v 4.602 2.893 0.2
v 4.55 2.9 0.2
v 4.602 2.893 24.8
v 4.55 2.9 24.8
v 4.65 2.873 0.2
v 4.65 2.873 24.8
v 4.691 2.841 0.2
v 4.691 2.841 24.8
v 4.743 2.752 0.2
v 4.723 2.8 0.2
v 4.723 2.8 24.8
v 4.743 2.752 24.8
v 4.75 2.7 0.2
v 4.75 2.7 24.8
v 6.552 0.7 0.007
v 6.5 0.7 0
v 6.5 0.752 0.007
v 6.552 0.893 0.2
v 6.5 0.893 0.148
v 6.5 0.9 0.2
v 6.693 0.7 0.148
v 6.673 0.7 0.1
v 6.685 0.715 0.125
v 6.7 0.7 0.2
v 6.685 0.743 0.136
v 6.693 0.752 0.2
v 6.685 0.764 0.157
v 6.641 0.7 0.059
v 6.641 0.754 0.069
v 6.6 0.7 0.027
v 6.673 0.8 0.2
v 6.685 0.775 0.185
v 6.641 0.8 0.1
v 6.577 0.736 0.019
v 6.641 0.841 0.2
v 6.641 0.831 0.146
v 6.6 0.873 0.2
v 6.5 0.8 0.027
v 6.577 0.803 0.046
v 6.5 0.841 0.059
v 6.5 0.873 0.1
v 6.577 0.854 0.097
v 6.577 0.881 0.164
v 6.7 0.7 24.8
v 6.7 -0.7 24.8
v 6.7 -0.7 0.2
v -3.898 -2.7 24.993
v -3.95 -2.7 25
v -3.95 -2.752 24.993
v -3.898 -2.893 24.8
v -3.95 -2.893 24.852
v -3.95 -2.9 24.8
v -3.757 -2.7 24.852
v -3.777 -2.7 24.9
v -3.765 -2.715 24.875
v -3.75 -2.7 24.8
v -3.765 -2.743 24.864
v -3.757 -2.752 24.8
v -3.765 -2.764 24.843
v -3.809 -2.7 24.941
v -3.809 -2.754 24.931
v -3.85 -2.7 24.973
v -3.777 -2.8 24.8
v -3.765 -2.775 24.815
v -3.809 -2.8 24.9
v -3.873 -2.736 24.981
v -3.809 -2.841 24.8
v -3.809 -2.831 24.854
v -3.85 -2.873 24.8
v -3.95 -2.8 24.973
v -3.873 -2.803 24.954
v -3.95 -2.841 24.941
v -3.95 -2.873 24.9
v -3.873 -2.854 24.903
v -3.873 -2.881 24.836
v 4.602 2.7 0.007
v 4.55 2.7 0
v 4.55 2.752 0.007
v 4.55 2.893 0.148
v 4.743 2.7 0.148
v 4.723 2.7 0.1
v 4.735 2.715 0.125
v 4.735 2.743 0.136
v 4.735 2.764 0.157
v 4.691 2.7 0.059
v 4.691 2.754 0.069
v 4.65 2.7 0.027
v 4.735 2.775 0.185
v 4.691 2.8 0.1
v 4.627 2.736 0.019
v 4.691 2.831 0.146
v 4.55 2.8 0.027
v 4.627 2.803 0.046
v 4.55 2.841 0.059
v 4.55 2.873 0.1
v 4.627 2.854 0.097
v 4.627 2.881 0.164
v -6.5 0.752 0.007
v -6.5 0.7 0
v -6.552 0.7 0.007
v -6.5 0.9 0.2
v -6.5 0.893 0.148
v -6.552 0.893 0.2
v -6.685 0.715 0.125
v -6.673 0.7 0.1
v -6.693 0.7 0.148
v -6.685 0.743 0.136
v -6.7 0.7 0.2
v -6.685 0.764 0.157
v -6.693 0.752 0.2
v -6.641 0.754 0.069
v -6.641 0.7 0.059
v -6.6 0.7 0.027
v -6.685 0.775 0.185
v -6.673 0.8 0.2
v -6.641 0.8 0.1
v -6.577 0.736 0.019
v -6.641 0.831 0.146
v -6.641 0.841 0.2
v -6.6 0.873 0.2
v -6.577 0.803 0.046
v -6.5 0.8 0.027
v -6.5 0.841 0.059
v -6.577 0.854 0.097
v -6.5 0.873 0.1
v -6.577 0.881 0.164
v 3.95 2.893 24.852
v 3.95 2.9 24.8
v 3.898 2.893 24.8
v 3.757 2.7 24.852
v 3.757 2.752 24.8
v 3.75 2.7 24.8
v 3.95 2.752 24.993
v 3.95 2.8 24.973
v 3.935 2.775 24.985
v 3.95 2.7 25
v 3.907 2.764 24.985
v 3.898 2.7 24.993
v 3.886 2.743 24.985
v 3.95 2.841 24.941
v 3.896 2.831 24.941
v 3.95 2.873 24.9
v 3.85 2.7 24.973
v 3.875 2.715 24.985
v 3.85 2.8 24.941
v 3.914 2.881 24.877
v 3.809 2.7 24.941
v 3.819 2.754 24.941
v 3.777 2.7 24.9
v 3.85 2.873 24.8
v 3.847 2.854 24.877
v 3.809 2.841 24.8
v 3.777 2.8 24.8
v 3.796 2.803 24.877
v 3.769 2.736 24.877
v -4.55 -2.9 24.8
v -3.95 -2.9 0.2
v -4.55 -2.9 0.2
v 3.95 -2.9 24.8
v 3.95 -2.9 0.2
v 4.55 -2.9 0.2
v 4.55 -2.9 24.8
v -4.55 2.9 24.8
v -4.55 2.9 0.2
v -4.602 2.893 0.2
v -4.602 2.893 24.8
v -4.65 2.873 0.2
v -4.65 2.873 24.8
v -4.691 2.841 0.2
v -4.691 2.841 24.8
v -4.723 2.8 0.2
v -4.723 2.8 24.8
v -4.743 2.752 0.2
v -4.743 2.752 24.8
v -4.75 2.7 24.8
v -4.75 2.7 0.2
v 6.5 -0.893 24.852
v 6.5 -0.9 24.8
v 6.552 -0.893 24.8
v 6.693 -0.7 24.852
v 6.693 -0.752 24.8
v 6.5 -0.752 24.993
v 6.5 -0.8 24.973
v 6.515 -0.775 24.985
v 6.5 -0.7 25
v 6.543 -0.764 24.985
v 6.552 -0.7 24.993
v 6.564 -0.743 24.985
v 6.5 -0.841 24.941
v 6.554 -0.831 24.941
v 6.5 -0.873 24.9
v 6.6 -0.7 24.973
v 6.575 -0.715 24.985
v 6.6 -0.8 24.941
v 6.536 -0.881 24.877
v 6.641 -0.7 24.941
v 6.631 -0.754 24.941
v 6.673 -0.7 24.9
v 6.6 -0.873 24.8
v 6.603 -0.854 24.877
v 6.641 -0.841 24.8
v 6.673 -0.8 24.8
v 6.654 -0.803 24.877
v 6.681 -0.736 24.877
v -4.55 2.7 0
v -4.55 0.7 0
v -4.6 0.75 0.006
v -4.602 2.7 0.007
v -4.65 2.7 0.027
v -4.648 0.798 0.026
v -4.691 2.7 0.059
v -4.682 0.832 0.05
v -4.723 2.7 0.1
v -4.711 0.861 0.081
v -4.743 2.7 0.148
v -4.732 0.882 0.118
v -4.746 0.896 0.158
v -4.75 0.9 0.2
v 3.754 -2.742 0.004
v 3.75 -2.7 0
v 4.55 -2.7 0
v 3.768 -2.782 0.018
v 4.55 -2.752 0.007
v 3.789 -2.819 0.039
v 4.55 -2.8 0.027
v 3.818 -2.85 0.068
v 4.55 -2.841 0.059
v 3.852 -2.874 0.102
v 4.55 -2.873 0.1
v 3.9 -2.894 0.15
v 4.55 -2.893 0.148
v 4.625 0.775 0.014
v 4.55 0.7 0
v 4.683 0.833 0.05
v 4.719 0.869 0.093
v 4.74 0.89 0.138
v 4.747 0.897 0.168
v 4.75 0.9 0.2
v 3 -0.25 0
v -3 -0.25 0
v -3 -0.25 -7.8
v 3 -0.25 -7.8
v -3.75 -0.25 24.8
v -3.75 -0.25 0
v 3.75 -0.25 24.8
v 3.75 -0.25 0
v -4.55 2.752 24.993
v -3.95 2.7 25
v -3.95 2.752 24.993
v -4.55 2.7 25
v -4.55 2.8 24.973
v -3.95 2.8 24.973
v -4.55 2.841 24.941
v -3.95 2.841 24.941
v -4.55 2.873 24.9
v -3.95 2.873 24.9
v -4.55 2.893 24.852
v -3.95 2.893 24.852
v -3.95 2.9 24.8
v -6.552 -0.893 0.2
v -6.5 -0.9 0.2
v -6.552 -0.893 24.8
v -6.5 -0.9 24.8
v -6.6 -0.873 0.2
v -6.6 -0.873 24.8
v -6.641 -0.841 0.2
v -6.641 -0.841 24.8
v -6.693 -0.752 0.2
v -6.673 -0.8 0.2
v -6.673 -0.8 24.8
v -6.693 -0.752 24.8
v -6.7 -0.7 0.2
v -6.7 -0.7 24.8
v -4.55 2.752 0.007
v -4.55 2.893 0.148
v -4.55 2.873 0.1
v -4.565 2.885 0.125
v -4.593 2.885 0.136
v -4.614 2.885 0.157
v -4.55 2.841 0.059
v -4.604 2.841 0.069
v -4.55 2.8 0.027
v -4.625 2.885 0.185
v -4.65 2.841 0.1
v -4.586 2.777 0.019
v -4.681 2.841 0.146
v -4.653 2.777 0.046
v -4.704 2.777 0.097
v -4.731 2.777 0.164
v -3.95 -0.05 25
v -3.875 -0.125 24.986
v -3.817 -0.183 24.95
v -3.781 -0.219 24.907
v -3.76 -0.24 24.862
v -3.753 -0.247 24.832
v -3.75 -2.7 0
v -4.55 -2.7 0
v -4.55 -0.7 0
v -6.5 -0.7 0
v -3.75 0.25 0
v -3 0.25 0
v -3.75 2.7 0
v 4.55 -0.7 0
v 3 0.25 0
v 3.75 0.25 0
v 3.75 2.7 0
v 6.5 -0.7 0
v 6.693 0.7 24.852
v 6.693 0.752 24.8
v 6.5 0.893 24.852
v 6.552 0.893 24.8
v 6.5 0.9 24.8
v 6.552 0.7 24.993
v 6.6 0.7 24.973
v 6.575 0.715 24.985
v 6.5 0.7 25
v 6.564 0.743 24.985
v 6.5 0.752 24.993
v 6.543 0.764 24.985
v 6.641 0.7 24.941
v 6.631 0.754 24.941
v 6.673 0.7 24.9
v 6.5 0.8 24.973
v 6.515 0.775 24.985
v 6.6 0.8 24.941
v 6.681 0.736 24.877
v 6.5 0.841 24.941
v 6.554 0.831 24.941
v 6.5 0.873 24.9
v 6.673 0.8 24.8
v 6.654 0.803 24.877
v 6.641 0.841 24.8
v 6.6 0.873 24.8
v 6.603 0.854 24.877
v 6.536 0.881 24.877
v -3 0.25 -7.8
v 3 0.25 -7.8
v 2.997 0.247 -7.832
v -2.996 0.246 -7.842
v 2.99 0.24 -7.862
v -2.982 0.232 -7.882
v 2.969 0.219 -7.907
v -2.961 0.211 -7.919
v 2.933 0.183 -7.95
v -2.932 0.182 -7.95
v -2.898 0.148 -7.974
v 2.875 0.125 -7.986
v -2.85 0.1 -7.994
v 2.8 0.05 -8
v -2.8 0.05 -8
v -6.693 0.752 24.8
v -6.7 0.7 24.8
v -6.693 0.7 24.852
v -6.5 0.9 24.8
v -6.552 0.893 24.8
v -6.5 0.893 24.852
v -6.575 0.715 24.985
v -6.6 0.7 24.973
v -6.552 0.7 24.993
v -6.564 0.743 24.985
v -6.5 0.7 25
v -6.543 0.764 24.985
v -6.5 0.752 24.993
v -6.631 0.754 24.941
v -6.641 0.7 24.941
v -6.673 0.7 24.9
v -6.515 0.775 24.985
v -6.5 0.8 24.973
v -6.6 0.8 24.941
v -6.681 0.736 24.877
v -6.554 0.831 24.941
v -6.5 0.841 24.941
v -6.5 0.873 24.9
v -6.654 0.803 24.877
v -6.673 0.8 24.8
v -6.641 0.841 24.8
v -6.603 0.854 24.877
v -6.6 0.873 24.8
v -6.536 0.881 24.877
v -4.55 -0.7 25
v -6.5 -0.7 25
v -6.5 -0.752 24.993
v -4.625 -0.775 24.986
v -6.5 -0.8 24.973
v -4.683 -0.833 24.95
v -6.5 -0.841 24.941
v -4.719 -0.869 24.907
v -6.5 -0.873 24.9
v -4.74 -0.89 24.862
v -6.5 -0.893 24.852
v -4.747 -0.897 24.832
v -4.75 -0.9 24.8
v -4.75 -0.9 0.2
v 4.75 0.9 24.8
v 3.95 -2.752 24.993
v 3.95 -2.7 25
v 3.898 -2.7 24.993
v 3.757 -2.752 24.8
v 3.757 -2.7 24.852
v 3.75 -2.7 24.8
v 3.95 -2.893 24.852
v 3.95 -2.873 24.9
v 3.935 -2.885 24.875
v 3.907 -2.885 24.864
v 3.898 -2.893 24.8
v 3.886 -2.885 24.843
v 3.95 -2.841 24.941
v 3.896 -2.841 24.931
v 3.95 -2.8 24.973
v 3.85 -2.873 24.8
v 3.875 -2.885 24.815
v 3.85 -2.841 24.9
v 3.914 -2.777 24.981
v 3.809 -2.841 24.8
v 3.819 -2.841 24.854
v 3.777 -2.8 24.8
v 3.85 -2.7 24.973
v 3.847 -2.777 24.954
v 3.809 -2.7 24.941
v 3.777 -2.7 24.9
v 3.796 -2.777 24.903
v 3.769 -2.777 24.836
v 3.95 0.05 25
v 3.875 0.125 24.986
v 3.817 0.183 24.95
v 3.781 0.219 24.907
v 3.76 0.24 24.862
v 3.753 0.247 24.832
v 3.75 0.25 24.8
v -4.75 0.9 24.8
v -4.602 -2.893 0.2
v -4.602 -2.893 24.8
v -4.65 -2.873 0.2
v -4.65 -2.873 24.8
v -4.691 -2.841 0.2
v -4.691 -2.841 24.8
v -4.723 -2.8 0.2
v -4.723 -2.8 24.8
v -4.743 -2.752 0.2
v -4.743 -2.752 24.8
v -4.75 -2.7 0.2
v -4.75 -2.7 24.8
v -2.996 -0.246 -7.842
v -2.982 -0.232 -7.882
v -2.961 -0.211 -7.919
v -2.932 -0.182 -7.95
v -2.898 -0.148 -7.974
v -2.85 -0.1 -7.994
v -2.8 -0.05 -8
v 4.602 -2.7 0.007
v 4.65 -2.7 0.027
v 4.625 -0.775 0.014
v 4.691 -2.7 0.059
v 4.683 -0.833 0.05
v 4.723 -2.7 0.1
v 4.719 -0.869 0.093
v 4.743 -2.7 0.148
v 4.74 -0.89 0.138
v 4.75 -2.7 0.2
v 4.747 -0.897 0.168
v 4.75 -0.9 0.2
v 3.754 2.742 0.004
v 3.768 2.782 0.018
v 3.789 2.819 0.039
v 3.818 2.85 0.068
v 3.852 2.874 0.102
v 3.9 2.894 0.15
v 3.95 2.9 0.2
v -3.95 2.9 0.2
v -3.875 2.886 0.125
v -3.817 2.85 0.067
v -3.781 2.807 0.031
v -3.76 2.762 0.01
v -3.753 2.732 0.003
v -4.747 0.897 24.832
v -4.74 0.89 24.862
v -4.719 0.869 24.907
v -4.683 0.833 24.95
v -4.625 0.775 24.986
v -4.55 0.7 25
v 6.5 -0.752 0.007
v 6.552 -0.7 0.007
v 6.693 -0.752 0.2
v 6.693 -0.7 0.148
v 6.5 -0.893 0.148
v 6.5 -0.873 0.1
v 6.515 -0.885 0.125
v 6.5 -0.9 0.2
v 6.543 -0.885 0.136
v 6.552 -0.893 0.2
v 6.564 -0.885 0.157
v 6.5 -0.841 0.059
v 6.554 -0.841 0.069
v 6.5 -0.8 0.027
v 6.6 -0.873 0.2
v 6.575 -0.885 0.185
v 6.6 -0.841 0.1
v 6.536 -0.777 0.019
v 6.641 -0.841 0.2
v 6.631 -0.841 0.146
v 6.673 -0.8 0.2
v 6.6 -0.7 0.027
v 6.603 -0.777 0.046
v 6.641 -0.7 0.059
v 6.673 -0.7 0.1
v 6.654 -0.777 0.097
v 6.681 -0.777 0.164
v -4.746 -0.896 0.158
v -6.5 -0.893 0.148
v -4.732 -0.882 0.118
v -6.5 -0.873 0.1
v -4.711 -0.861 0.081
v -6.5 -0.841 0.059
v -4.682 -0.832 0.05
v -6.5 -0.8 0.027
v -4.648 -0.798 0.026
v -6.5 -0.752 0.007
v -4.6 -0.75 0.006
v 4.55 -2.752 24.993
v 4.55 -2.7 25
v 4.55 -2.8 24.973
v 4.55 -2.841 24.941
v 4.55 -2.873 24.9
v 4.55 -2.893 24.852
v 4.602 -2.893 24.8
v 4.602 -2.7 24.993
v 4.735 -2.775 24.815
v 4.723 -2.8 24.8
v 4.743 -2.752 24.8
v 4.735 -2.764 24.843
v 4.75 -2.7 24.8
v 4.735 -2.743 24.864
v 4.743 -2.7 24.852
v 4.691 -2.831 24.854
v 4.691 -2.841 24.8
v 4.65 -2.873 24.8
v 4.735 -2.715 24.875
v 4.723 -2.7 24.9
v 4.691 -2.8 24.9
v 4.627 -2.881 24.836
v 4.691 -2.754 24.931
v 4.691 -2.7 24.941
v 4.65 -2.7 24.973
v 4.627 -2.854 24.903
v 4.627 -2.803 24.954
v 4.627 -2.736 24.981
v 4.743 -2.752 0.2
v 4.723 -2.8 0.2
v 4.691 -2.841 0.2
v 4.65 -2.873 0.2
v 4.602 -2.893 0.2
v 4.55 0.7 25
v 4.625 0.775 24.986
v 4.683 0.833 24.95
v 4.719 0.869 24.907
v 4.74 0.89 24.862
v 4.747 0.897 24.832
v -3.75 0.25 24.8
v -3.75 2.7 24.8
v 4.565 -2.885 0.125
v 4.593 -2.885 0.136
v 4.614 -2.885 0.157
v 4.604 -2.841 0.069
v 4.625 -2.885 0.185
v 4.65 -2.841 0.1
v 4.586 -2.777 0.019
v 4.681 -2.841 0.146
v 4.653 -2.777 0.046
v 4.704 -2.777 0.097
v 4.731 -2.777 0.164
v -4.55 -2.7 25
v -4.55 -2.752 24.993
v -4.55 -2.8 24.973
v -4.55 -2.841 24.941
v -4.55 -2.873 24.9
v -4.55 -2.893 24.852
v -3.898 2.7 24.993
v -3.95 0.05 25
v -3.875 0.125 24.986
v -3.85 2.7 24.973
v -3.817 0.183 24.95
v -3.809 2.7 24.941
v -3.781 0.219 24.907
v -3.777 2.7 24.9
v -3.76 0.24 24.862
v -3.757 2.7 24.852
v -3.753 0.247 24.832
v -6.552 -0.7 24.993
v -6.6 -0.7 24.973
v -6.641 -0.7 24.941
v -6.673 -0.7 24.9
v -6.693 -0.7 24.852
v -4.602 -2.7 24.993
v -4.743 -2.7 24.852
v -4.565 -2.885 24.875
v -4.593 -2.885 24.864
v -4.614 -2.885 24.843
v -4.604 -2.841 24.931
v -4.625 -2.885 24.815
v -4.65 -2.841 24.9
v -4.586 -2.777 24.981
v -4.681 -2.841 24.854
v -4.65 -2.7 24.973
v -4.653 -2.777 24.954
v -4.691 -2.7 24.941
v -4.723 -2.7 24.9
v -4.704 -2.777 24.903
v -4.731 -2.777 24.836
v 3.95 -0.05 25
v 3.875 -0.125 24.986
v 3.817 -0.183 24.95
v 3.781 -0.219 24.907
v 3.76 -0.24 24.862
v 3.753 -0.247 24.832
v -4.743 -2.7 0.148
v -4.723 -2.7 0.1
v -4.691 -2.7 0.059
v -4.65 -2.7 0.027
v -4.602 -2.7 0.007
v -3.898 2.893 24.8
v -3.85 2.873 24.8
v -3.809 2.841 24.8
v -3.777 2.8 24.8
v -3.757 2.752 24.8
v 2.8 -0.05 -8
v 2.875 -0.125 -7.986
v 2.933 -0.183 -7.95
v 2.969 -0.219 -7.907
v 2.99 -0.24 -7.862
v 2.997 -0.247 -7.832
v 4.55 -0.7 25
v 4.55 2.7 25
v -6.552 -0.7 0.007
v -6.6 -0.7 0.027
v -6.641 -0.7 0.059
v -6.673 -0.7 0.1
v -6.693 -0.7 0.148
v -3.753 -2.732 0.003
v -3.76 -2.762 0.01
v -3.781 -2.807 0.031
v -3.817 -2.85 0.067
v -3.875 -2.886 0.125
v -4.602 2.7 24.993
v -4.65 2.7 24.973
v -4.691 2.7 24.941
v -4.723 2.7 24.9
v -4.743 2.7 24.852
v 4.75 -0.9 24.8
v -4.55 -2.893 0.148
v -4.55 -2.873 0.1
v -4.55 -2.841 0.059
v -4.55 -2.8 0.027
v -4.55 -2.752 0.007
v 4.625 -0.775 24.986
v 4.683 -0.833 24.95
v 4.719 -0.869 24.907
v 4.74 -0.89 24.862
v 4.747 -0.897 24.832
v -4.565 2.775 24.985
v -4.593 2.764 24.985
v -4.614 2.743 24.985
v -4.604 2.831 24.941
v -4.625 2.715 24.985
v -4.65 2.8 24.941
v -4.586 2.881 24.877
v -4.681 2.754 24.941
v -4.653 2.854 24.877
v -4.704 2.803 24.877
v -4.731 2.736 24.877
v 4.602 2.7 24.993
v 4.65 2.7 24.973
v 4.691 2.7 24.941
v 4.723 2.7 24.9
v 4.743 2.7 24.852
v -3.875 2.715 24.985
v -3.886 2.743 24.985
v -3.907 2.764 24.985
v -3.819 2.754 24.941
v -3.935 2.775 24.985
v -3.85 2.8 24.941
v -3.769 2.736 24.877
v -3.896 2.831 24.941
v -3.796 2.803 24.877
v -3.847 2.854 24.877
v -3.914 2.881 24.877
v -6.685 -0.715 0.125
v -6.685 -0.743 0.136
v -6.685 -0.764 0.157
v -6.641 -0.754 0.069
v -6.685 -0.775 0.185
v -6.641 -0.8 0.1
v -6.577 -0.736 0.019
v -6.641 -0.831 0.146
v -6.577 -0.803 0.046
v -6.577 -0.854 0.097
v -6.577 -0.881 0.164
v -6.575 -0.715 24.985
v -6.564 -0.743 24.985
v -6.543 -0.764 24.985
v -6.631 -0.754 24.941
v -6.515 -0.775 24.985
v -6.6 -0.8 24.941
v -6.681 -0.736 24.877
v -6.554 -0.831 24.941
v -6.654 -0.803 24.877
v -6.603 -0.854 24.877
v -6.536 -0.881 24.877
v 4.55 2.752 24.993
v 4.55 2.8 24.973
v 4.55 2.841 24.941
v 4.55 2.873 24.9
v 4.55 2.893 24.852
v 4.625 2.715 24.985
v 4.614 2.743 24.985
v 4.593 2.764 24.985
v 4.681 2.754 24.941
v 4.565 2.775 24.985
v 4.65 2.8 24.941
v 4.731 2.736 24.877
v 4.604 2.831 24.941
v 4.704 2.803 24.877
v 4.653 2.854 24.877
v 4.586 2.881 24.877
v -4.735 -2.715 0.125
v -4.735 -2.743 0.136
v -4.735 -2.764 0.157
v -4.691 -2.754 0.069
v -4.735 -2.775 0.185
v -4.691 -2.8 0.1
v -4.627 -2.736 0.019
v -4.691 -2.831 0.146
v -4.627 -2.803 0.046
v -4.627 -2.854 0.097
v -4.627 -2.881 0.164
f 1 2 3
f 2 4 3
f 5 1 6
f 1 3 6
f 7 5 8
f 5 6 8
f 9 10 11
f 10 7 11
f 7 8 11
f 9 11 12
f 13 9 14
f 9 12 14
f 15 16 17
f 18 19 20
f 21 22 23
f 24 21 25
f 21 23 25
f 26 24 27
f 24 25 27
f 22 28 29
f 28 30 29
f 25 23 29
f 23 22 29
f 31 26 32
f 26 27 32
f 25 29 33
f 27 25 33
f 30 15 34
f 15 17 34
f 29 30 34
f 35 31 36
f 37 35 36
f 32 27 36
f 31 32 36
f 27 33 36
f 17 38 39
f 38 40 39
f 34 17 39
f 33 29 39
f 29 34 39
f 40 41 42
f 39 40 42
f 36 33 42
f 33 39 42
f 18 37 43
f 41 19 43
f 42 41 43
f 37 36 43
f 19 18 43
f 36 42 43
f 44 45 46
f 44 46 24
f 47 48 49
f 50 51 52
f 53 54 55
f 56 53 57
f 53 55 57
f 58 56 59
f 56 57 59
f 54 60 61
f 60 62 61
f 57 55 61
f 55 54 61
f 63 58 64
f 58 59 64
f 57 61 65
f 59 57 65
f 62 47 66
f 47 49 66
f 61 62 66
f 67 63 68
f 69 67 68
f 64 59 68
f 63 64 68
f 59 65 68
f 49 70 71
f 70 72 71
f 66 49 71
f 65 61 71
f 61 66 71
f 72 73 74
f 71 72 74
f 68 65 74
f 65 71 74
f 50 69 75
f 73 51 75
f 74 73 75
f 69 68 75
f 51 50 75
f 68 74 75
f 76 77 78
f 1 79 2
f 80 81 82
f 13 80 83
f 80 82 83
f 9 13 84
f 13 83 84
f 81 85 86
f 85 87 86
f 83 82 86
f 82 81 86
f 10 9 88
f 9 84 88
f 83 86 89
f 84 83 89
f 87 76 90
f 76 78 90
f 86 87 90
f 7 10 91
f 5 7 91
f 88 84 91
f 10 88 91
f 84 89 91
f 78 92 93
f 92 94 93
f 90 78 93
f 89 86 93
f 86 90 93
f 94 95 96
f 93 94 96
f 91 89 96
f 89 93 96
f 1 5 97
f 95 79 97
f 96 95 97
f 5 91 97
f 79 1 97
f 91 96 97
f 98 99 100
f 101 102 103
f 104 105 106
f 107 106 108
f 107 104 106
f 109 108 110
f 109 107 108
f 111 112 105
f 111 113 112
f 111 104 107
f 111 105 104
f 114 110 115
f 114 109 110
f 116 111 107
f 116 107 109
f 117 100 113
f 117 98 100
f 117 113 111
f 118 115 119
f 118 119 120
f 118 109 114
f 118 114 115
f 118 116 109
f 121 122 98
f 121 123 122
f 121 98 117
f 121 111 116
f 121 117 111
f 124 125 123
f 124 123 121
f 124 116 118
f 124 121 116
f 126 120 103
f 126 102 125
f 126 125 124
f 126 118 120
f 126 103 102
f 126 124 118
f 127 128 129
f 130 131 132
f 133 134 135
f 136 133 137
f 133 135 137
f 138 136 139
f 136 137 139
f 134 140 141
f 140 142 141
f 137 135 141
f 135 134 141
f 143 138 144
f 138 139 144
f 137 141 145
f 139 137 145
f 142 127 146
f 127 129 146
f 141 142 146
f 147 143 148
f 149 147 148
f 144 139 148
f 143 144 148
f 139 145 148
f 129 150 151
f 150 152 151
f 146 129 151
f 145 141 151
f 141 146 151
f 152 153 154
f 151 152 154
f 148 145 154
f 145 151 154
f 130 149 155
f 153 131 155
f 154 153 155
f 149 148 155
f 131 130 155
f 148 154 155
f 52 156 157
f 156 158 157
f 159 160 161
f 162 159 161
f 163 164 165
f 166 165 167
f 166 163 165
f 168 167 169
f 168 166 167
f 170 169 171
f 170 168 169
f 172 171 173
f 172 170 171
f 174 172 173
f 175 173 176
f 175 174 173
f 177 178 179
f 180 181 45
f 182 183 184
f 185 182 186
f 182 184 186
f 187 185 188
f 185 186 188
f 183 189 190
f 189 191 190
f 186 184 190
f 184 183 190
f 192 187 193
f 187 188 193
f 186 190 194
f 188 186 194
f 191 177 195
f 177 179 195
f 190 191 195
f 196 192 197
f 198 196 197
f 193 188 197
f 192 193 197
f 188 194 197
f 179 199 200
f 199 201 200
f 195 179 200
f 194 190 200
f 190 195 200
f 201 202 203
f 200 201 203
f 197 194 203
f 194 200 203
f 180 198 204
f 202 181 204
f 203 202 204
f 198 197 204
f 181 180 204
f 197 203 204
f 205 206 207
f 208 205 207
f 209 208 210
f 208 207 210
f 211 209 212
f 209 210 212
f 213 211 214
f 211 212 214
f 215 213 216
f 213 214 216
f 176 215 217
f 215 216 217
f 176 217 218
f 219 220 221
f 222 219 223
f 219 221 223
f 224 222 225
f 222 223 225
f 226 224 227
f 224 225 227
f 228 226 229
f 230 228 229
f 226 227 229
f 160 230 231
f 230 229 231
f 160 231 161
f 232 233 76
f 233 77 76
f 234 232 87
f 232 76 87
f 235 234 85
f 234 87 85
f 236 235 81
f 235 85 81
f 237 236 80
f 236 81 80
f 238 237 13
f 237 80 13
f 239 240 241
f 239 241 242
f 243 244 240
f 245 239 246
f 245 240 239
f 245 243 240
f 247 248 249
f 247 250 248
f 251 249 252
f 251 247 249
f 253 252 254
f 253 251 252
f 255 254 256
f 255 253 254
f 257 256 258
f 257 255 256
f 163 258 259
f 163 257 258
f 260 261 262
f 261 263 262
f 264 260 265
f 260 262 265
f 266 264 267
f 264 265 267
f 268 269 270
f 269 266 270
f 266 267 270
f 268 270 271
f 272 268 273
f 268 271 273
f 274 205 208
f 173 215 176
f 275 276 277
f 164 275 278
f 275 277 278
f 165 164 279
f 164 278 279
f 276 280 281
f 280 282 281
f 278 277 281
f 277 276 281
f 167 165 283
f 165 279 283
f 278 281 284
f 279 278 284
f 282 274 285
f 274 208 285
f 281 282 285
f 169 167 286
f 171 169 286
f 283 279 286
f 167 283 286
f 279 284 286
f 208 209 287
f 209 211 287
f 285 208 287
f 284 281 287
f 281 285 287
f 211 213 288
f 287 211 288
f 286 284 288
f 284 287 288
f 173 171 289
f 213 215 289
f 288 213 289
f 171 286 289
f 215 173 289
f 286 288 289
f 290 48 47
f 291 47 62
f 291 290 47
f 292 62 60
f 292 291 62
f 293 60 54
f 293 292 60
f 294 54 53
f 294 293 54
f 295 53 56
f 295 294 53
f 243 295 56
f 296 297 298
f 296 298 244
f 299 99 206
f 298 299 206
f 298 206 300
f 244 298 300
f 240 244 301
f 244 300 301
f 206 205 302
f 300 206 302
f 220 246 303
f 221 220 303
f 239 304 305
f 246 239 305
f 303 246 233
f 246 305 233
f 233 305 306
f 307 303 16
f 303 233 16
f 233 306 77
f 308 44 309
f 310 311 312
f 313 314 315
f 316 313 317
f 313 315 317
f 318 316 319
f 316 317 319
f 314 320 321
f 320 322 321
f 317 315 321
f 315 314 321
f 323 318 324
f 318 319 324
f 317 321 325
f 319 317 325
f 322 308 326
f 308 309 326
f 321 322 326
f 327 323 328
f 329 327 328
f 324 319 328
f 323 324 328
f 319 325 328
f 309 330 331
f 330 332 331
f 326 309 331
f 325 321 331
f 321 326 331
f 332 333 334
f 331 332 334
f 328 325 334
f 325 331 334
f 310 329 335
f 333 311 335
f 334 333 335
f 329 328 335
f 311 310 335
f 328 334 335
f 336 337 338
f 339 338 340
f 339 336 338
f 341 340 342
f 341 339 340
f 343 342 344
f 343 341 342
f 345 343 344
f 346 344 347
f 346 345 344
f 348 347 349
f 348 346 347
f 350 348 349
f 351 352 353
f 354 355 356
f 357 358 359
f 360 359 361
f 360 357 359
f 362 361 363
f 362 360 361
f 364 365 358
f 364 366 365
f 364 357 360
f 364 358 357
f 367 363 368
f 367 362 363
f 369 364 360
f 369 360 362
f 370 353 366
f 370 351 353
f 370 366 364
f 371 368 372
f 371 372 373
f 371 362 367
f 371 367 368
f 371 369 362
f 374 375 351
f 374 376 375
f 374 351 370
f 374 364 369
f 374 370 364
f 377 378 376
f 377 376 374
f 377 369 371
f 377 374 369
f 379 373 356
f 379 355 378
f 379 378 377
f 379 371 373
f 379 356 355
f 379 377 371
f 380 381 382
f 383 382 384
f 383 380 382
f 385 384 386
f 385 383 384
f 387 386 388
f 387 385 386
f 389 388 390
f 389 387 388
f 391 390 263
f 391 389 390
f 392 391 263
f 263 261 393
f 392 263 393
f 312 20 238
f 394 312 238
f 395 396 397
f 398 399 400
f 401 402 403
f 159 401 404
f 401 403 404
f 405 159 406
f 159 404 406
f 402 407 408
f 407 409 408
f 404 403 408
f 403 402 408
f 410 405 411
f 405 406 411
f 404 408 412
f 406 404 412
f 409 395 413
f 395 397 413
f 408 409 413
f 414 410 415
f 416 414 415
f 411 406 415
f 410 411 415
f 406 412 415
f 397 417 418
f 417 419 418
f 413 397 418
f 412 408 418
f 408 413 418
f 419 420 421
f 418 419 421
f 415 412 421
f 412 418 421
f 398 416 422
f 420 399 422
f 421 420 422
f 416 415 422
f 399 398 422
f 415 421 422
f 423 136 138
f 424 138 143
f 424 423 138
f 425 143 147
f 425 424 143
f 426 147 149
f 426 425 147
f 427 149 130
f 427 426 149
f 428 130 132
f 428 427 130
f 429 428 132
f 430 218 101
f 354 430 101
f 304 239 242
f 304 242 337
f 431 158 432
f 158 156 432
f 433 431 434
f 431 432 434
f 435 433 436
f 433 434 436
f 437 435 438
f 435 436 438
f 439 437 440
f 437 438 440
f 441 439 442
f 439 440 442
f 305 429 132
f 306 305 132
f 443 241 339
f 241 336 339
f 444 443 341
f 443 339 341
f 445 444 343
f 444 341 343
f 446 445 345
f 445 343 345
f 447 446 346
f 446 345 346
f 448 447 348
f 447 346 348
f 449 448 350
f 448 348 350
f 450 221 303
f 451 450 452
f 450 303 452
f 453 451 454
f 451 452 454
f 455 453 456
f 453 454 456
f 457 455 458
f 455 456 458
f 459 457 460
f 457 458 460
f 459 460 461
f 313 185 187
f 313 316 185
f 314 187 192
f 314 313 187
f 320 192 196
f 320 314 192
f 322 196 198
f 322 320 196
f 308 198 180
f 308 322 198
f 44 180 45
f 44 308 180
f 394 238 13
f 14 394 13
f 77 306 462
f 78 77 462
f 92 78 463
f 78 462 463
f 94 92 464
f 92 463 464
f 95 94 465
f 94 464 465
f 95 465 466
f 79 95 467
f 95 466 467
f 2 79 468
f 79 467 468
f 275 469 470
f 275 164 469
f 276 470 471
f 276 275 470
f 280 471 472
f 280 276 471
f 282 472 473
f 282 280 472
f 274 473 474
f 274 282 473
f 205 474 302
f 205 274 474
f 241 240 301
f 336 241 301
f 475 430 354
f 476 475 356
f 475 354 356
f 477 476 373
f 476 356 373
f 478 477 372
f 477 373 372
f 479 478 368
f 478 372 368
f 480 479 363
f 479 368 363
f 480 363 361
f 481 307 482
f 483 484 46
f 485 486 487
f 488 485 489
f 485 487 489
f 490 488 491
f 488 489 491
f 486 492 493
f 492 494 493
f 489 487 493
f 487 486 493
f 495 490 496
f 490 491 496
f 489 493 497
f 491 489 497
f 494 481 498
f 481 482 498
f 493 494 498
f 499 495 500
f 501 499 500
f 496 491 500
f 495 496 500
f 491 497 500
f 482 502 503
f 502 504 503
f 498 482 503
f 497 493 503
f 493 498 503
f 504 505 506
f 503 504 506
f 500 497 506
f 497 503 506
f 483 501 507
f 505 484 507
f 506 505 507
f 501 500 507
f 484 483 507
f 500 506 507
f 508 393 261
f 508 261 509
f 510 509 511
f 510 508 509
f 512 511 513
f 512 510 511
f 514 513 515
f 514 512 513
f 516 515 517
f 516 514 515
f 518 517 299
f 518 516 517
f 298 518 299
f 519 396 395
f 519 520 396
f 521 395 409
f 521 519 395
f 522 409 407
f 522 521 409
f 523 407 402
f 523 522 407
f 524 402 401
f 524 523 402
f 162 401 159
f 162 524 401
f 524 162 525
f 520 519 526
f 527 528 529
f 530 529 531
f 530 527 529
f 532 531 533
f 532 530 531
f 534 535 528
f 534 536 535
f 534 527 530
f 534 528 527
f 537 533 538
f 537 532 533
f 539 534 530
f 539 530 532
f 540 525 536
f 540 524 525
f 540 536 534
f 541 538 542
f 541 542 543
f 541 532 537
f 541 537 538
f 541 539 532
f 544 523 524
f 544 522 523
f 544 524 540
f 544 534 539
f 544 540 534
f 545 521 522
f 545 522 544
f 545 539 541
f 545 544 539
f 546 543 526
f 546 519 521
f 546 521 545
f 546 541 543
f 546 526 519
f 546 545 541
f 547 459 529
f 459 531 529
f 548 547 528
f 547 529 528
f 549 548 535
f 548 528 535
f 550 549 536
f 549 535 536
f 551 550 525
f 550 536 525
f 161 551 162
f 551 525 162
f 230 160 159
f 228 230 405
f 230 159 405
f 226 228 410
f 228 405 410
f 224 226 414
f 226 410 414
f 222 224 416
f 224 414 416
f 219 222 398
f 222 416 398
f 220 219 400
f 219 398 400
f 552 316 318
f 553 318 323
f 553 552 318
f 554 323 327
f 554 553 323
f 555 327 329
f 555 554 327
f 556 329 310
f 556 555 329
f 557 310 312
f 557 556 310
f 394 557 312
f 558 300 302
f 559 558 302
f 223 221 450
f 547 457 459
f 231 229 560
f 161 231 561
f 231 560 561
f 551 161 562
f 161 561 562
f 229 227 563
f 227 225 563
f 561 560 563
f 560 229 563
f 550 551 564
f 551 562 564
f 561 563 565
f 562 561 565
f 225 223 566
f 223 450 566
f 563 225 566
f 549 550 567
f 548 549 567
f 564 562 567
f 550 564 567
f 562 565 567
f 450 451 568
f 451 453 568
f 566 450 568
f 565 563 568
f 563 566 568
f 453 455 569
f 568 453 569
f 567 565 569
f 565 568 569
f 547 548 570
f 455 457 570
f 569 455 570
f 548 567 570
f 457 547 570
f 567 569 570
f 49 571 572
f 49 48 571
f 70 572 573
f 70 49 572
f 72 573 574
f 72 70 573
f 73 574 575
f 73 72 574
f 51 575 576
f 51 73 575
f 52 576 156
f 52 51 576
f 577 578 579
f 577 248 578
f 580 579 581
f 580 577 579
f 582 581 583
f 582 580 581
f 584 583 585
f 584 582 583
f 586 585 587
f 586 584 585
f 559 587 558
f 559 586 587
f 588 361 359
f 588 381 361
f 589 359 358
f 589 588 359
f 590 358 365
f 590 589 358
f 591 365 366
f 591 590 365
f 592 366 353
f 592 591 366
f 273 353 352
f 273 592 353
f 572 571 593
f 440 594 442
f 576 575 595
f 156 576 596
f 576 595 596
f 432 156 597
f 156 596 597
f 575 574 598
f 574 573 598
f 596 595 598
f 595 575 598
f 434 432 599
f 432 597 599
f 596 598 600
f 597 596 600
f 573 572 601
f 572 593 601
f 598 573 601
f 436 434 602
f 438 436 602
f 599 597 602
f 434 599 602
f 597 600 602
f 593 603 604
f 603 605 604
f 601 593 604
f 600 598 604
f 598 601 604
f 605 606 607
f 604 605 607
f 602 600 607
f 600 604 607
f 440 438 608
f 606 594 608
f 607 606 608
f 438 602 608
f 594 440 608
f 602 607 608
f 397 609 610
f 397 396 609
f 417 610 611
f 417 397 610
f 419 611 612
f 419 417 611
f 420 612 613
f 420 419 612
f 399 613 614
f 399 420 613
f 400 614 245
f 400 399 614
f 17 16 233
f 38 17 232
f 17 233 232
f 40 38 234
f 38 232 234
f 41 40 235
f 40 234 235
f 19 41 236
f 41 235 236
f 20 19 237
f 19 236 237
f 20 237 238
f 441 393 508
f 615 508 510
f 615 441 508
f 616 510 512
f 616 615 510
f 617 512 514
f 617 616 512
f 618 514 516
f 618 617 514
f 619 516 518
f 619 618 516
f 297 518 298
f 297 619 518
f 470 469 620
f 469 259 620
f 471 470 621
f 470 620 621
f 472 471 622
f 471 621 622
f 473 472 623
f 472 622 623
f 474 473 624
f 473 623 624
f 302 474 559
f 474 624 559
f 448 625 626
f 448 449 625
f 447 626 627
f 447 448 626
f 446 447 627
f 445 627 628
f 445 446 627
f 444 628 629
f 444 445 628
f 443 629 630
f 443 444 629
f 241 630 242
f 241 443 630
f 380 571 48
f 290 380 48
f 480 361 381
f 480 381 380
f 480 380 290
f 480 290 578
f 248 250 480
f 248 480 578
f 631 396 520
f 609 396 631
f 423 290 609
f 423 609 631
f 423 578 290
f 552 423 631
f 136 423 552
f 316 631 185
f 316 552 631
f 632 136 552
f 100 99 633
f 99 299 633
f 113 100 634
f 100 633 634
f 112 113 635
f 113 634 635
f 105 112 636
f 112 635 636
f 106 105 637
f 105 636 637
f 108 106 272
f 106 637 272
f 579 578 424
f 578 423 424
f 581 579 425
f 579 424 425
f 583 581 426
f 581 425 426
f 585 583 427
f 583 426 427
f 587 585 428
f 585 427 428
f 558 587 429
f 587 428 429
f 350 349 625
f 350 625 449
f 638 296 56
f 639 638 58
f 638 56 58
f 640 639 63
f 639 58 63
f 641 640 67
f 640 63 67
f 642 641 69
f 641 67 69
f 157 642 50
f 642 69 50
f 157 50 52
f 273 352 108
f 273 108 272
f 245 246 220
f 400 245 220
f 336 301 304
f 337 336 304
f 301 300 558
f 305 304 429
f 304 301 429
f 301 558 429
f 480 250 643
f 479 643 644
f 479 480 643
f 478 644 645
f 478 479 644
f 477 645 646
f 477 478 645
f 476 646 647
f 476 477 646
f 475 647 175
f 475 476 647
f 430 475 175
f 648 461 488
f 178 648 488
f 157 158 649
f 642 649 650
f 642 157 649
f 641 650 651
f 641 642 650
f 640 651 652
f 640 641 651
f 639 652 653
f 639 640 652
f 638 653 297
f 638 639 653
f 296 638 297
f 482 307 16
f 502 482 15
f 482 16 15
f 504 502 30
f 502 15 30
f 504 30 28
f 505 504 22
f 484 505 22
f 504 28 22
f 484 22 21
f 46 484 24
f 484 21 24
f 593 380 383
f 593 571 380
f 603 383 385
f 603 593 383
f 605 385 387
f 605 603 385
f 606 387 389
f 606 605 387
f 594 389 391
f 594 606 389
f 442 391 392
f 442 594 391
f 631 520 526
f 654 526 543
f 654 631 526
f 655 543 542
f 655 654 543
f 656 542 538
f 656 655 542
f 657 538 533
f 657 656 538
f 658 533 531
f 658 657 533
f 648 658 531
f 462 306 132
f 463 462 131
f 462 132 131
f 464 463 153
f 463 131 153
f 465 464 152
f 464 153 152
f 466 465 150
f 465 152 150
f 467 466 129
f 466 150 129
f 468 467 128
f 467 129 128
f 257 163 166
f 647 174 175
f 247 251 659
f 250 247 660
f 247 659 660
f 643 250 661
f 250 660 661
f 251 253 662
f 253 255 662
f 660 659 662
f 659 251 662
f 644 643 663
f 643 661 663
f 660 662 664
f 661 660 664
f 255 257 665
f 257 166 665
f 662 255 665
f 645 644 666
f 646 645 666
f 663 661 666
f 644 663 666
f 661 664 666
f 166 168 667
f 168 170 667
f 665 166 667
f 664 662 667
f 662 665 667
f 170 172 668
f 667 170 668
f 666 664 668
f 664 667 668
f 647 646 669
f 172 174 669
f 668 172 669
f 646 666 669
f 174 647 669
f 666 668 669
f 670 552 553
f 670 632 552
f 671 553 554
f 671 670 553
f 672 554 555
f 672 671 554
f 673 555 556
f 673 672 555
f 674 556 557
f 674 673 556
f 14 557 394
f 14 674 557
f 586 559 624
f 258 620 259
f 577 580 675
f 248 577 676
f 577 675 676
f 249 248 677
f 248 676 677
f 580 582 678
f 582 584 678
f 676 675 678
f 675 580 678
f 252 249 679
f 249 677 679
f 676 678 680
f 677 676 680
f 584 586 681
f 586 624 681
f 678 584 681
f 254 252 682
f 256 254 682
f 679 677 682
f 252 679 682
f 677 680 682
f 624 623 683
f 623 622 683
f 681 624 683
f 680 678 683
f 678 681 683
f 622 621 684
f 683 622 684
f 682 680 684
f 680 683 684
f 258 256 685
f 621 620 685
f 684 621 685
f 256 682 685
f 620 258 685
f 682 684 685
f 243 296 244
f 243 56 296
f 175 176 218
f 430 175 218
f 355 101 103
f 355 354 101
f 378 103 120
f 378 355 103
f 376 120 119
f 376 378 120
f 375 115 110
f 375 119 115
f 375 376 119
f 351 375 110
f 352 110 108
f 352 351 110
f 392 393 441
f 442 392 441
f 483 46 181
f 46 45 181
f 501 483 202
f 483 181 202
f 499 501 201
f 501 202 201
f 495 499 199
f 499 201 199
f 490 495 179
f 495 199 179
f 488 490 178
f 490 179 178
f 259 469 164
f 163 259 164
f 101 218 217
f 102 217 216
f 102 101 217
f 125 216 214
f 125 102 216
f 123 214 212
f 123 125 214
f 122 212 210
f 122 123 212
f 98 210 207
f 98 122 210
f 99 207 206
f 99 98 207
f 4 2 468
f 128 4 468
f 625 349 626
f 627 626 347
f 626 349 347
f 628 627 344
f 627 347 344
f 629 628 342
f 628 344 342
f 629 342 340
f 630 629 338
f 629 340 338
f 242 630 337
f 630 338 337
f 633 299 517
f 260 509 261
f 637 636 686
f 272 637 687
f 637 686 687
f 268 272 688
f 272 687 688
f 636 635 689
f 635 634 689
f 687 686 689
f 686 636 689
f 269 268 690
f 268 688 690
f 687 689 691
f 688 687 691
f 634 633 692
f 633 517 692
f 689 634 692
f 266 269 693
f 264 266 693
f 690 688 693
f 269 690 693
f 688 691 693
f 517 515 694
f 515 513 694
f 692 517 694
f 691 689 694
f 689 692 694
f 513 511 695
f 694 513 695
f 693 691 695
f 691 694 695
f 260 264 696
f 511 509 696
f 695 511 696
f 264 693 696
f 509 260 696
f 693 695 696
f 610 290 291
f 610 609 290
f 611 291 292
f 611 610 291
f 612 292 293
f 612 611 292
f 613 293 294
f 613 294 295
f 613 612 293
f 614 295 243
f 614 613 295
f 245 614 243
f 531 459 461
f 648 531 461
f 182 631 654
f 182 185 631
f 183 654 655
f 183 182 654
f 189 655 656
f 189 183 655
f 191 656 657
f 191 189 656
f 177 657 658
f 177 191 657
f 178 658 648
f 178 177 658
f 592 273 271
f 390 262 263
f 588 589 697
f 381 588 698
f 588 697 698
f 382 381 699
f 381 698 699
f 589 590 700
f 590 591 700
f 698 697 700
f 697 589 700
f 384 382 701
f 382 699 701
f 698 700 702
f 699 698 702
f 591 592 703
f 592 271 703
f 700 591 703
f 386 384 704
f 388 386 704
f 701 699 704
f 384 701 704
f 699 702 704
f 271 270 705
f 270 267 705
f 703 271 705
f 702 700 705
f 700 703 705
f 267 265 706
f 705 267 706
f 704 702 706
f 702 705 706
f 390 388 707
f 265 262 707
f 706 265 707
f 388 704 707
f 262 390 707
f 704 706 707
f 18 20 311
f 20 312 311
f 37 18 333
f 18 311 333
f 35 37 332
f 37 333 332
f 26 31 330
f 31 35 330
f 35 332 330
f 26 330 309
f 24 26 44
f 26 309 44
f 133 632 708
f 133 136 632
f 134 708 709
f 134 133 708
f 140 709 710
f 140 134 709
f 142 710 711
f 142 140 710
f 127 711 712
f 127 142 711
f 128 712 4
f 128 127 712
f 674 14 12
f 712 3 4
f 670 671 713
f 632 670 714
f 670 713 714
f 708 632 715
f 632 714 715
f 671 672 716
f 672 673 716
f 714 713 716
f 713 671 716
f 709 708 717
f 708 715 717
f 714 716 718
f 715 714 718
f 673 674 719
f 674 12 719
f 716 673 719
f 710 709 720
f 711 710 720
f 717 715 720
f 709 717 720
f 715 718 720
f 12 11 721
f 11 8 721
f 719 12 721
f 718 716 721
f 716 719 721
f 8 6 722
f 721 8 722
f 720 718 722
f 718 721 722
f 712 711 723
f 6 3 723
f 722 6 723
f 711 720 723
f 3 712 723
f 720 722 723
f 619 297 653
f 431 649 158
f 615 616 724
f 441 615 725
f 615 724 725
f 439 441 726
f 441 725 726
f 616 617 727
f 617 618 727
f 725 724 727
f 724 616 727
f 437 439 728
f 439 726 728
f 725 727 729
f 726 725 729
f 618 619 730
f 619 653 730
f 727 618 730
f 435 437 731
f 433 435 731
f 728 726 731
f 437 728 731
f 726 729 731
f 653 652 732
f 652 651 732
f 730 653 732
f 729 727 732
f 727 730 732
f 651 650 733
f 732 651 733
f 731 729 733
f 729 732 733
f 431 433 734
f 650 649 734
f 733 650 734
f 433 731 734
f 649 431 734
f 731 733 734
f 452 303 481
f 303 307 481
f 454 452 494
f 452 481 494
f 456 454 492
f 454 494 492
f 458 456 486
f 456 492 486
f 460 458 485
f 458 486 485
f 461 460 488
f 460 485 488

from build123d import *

# Parameters (mm, degrees)
AUFSATZ_LINEAR_AUSTRAGEN1_DEPTH = 25
SKIZZE2_W                       = 6
SKIZZE2_H                       = 1.8
AUFSATZ_LINEAR_AUSTRAGEN2_DEPTH = 8
SKIZZE3_W                       = 7.5
SKIZZE3_H                       = 0.65
SCHNITT_LINEAR_AUSTRAGEN1_DEPTH = 34
VERRUNDUNG1_R                   = 0.2


with BuildPart() as part:
    # Skizze1 → Aufsatz-Linear austragen1 (new body)
    with BuildSketch(Plane.XY):
        Polygon((-4.75, 0.9), (-6.7, 0.9), (-6.7, -0.9), (-4.75, -0.9), (-4.75, -2.9), (-3.75, -2.9), (-3.75, -0.9), (3.75, -0.9), (3.75, -2.9), (4.75, -2.9), (4.75, -0.9), (6.7, -0.9), (6.7, 0.9), (4.75, 0.9), (4.75, 2.9), (3.75, 2.9), (3.75, 0.9), (-3.75, 0.9), (-3.75, 2.9), (-4.75, 2.9), align=None)
    extrude(amount=AUFSATZ_LINEAR_AUSTRAGEN1_DEPTH)

    # Skizze2 → Aufsatz-Linear austragen2 (add)
    with BuildSketch(Plane(origin=(0, 0, 0), x_dir=(-1, 0, 0), z_dir=(0, 0, -1))):
        Rectangle(SKIZZE2_W, SKIZZE2_H)
    extrude(amount=AUFSATZ_LINEAR_AUSTRAGEN2_DEPTH)

    # Skizze3 → Schnitt-Linear austragen1 (cut, through all)
    with BuildSketch(Plane.XY.offset(25)):
        with Locations((0, -0.575)):
            Rectangle(SKIZZE3_W, SKIZZE3_H)
        with Locations((0, 0.575)):
            Rectangle(SKIZZE3_W, SKIZZE3_H)
    extrude(amount=-SCHNITT_LINEAR_AUSTRAGEN1_DEPTH, mode=Mode.SUBTRACT)

    # Verrundung1
    verrundung1_edges = [part.edges().sort_by_distance(p)[0] for p in [
        (0, 0.25, 25),
        (-4.75, -1.9, 25),
        (-4.25, -2.9, 25),
        (-5.725, 0.9, 0),
        (-4.75, 1.9, 0),
        (-4.25, 2.9, 0),
        (-3.75, -1.575, 25),
        (4.25, 2.9, 0),
        (4.75, 1.9, 0),
        (5.725, 0.9, 0),
        (6.7, 0, 0),
        (5.725, -0.9, 0),
        (4.75, -1.9, 0),
        (4.25, -2.9, 0),
        (-4.25, -2.9, 0),
        (-4.75, -1.9, 0),
        (-5.725, -0.9, 0),
        (-6.7, 0, 0),
        (3.75, -1.575, 25),
        (4.25, -2.9, 25),
        (-6.7, 0.9, 12.5),
        (-4.75, 2.9, 12.5),
        (-3.75, 2.9, 12.5),
        (3.75, 2.9, 12.5),
        (4.75, 2.9, 12.5),
        (6.7, 0.9, 12.5),
        (6.7, -0.9, 12.5),
        (4.75, -2.9, 12.5),
        (3.75, -2.9, 12.5),
        (-3.75, -2.9, 12.5),
        (-4.75, -2.9, 12.5),
        (-6.7, -0.9, 12.5),
        (4.75, -1.9, 25),
        (5.725, -0.9, 25),
        (6.7, 0, 25),
        (5.725, 0.9, 25),
        (-6.7, 0, 25),
        (4.75, 1.9, 25),
        (4.25, 2.9, 25),
        (3.75, 1.575, 25),
        (-3.75, 1.575, 25),
        (3, 0, -8),
        (-3, 0, -8),
        (-4.25, 2.9, 25),
        (0, 0.25, -8),
        (0, -0.25, -8),
        (-4.75, 1.9, 25),
        (-5.725, 0.9, 25),
        (0, -0.25, 25),
        (-5.725, -0.9, 25),
    ]]
    fillet(verrundung1_edges, radius=VERRUNDUNG1_R)


solid = part.part
